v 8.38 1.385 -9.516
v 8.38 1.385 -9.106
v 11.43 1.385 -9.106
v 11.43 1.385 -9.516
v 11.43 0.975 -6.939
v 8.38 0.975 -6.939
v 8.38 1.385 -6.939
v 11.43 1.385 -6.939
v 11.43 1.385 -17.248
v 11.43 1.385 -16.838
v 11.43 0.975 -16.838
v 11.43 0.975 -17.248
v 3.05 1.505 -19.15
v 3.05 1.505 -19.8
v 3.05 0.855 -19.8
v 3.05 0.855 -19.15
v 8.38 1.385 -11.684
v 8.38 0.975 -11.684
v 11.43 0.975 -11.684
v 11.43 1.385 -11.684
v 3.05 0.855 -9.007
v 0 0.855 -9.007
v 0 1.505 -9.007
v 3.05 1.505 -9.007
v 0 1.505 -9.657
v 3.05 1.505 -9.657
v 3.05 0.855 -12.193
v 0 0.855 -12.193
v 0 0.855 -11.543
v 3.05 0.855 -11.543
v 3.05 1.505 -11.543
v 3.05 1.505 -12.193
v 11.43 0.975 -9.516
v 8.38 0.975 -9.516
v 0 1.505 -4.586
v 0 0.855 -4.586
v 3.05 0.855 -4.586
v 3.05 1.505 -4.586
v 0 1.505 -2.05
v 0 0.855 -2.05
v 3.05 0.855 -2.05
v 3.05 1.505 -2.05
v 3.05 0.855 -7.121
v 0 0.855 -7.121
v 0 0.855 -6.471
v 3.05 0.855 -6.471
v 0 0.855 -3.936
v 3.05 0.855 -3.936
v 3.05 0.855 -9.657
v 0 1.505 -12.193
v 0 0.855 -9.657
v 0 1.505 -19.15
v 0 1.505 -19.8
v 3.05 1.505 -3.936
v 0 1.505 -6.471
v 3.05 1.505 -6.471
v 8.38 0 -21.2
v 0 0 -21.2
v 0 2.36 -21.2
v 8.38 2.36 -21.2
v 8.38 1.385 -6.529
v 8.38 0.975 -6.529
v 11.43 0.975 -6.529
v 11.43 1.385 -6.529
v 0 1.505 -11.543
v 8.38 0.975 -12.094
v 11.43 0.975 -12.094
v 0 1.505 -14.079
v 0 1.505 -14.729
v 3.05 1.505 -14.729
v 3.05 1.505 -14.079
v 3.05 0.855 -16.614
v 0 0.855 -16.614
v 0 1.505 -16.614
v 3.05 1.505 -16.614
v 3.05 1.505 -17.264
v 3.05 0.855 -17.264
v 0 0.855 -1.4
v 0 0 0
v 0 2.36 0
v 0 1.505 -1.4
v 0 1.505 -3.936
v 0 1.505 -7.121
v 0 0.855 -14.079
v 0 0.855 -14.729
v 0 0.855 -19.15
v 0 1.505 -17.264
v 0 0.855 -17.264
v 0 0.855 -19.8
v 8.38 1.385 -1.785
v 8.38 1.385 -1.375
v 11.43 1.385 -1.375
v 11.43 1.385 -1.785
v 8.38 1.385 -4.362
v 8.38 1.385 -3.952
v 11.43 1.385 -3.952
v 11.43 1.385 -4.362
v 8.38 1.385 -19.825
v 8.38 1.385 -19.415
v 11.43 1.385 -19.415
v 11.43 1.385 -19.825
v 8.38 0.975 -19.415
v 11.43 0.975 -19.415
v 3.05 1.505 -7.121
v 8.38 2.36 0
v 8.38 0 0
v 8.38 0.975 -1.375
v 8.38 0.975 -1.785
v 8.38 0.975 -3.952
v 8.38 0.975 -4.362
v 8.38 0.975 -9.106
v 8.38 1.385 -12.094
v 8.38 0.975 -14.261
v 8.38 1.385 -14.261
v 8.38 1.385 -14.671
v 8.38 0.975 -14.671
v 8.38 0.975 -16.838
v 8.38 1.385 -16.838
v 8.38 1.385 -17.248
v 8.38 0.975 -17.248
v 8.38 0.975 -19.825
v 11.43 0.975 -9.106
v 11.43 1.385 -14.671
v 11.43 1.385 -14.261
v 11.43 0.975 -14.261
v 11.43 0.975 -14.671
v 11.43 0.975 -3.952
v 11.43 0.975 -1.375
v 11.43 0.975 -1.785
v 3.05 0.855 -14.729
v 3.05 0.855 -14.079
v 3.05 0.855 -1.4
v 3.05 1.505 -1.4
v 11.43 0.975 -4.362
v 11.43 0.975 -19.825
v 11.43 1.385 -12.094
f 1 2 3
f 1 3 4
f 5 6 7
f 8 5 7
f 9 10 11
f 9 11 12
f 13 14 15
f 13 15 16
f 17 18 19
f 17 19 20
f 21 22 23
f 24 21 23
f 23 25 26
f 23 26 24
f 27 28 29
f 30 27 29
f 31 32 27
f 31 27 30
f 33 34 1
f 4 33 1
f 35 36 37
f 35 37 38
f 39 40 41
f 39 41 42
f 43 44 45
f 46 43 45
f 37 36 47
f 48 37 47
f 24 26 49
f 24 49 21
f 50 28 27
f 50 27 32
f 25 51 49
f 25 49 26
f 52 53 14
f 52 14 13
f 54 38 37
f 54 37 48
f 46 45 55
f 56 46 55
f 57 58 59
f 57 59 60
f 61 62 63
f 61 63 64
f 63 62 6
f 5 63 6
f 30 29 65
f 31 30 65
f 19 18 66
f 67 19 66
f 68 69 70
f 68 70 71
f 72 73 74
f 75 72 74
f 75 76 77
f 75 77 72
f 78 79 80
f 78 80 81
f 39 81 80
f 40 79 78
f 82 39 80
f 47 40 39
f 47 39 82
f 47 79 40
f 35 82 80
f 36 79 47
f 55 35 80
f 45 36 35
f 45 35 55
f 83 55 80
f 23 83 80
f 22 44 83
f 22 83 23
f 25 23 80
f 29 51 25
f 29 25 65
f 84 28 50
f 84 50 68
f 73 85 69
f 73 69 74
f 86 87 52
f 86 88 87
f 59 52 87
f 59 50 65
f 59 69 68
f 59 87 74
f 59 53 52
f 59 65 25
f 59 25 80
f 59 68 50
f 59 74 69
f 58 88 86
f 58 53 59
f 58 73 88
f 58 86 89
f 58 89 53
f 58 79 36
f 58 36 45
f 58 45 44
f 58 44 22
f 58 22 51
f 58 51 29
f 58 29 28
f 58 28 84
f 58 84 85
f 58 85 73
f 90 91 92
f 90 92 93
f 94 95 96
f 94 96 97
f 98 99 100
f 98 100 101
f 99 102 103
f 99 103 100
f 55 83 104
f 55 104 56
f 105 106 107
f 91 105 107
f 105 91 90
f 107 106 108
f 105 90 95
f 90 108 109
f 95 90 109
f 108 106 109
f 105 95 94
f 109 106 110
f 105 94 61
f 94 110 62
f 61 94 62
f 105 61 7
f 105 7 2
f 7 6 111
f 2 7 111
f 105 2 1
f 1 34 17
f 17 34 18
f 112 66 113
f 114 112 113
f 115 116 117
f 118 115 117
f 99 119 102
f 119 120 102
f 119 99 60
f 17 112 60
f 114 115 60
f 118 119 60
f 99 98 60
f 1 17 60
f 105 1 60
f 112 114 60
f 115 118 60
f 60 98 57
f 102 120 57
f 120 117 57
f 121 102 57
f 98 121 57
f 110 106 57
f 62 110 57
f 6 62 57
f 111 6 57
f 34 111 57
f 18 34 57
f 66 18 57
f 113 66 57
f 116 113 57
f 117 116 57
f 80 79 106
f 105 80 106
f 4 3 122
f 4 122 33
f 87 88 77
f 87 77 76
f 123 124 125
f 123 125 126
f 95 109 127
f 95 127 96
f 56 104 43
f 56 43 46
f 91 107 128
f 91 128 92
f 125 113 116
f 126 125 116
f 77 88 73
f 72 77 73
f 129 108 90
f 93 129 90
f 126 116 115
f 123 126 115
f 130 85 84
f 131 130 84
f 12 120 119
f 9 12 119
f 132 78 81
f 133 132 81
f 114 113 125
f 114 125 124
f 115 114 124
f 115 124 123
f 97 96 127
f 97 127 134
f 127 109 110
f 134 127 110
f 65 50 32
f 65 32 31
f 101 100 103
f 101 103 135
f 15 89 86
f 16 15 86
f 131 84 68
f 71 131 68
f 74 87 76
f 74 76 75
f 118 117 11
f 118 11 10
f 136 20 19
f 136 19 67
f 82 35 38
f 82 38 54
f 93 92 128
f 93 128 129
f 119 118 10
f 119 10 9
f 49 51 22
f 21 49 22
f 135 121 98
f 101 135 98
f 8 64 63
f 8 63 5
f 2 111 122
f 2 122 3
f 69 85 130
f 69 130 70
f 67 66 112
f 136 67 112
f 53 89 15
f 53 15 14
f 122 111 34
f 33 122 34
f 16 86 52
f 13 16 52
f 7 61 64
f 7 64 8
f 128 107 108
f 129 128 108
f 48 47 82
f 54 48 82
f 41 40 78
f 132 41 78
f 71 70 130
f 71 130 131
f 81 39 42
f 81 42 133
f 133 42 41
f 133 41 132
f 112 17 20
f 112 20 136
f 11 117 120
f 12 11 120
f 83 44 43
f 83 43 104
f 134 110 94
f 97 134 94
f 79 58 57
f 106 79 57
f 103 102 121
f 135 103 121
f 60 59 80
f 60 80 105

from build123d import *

# Parameters (mm, degrees)
SKETCH1_W           = 8.38
SKETCH1_H           = 21.2
BOSS_EXTRUDE1_DEPTH = 2.36
SKETCH2_W           = 0.41
SKETCH2_H           = 0.41
BOSS_EXTRUDE2_DEPTH = 3.05
SKETCH3_W           = 0.65
SKETCH3_H           = 0.65
CUT_EXTRUDE1_DEPTH  = 3.05


with BuildPart() as part:
    # Sketch1 → Boss-Extrude1 (new body)
    with BuildSketch(Plane(origin=(0, 0, 0), x_dir=(1, 0, 0), z_dir=(0, 1, 0))):
        with Locations((4.19, 10.6)):
            Rectangle(SKETCH1_W, SKETCH1_H)
    extrude(amount=BOSS_EXTRUDE1_DEPTH)

    # Sketch2 → Boss-Extrude2 (add)
    with BuildSketch(Plane(origin=(8.38, 0, 0), x_dir=(0, 0, -1), z_dir=(1, 0, 0))):
        with Locations((1.58, 1.18)):
            Rectangle(SKETCH2_W, SKETCH2_H)
        with Locations((4.157142857, 1.18)):
            Rectangle(SKETCH2_W, SKETCH2_H)
        with Locations((6.734285714, 1.18)):
            Rectangle(SKETCH2_W, SKETCH2_H)
        with Locations((9.311428571, 1.18)):
            Rectangle(SKETCH2_W, SKETCH2_H)
        with Locations((11.888571429, 1.18)):
            Rectangle(SKETCH2_W, SKETCH2_H)
        with Locations((14.465714286, 1.18)):
            Rectangle(SKETCH2_W, SKETCH2_H)
        with Locations((17.042857143, 1.18)):
            Rectangle(SKETCH2_W, SKETCH2_H)
        with Locations((19.62, 1.18)):
            Rectangle(SKETCH2_W, SKETCH2_H)
    extrude(amount=BOSS_EXTRUDE2_DEPTH)

    # Sketch3 → Cut-Extrude1 (cut)
    with BuildSketch(Plane.ZY):
        with Locations((-19.475, 1.18)):
            Rectangle(SKETCH3_W, SKETCH3_H)
        with Locations((-16.939285714, 1.18)):
            Rectangle(SKETCH3_W, SKETCH3_H)
        with Locations((-14.403571429, 1.18)):
            Rectangle(SKETCH3_W, SKETCH3_H)
        with Locations((-11.867857143, 1.18)):
            Rectangle(SKETCH3_W, SKETCH3_H)
        with Locations((-9.332142857, 1.18)):
            Rectangle(SKETCH3_W, SKETCH3_H)
        with Locations((-6.796428571, 1.18)):
            Rectangle(SKETCH3_W, SKETCH3_H)
        with Locations((-4.260714286, 1.18)):
            Rectangle(SKETCH3_W, SKETCH3_H)
        with Locations((-1.725, 1.18)):
            Rectangle(SKETCH3_W, SKETCH3_H)
    extrude(amount=-CUT_EXTRUDE1_DEPTH, mode=Mode.SUBTRACT)


solid = part.part
